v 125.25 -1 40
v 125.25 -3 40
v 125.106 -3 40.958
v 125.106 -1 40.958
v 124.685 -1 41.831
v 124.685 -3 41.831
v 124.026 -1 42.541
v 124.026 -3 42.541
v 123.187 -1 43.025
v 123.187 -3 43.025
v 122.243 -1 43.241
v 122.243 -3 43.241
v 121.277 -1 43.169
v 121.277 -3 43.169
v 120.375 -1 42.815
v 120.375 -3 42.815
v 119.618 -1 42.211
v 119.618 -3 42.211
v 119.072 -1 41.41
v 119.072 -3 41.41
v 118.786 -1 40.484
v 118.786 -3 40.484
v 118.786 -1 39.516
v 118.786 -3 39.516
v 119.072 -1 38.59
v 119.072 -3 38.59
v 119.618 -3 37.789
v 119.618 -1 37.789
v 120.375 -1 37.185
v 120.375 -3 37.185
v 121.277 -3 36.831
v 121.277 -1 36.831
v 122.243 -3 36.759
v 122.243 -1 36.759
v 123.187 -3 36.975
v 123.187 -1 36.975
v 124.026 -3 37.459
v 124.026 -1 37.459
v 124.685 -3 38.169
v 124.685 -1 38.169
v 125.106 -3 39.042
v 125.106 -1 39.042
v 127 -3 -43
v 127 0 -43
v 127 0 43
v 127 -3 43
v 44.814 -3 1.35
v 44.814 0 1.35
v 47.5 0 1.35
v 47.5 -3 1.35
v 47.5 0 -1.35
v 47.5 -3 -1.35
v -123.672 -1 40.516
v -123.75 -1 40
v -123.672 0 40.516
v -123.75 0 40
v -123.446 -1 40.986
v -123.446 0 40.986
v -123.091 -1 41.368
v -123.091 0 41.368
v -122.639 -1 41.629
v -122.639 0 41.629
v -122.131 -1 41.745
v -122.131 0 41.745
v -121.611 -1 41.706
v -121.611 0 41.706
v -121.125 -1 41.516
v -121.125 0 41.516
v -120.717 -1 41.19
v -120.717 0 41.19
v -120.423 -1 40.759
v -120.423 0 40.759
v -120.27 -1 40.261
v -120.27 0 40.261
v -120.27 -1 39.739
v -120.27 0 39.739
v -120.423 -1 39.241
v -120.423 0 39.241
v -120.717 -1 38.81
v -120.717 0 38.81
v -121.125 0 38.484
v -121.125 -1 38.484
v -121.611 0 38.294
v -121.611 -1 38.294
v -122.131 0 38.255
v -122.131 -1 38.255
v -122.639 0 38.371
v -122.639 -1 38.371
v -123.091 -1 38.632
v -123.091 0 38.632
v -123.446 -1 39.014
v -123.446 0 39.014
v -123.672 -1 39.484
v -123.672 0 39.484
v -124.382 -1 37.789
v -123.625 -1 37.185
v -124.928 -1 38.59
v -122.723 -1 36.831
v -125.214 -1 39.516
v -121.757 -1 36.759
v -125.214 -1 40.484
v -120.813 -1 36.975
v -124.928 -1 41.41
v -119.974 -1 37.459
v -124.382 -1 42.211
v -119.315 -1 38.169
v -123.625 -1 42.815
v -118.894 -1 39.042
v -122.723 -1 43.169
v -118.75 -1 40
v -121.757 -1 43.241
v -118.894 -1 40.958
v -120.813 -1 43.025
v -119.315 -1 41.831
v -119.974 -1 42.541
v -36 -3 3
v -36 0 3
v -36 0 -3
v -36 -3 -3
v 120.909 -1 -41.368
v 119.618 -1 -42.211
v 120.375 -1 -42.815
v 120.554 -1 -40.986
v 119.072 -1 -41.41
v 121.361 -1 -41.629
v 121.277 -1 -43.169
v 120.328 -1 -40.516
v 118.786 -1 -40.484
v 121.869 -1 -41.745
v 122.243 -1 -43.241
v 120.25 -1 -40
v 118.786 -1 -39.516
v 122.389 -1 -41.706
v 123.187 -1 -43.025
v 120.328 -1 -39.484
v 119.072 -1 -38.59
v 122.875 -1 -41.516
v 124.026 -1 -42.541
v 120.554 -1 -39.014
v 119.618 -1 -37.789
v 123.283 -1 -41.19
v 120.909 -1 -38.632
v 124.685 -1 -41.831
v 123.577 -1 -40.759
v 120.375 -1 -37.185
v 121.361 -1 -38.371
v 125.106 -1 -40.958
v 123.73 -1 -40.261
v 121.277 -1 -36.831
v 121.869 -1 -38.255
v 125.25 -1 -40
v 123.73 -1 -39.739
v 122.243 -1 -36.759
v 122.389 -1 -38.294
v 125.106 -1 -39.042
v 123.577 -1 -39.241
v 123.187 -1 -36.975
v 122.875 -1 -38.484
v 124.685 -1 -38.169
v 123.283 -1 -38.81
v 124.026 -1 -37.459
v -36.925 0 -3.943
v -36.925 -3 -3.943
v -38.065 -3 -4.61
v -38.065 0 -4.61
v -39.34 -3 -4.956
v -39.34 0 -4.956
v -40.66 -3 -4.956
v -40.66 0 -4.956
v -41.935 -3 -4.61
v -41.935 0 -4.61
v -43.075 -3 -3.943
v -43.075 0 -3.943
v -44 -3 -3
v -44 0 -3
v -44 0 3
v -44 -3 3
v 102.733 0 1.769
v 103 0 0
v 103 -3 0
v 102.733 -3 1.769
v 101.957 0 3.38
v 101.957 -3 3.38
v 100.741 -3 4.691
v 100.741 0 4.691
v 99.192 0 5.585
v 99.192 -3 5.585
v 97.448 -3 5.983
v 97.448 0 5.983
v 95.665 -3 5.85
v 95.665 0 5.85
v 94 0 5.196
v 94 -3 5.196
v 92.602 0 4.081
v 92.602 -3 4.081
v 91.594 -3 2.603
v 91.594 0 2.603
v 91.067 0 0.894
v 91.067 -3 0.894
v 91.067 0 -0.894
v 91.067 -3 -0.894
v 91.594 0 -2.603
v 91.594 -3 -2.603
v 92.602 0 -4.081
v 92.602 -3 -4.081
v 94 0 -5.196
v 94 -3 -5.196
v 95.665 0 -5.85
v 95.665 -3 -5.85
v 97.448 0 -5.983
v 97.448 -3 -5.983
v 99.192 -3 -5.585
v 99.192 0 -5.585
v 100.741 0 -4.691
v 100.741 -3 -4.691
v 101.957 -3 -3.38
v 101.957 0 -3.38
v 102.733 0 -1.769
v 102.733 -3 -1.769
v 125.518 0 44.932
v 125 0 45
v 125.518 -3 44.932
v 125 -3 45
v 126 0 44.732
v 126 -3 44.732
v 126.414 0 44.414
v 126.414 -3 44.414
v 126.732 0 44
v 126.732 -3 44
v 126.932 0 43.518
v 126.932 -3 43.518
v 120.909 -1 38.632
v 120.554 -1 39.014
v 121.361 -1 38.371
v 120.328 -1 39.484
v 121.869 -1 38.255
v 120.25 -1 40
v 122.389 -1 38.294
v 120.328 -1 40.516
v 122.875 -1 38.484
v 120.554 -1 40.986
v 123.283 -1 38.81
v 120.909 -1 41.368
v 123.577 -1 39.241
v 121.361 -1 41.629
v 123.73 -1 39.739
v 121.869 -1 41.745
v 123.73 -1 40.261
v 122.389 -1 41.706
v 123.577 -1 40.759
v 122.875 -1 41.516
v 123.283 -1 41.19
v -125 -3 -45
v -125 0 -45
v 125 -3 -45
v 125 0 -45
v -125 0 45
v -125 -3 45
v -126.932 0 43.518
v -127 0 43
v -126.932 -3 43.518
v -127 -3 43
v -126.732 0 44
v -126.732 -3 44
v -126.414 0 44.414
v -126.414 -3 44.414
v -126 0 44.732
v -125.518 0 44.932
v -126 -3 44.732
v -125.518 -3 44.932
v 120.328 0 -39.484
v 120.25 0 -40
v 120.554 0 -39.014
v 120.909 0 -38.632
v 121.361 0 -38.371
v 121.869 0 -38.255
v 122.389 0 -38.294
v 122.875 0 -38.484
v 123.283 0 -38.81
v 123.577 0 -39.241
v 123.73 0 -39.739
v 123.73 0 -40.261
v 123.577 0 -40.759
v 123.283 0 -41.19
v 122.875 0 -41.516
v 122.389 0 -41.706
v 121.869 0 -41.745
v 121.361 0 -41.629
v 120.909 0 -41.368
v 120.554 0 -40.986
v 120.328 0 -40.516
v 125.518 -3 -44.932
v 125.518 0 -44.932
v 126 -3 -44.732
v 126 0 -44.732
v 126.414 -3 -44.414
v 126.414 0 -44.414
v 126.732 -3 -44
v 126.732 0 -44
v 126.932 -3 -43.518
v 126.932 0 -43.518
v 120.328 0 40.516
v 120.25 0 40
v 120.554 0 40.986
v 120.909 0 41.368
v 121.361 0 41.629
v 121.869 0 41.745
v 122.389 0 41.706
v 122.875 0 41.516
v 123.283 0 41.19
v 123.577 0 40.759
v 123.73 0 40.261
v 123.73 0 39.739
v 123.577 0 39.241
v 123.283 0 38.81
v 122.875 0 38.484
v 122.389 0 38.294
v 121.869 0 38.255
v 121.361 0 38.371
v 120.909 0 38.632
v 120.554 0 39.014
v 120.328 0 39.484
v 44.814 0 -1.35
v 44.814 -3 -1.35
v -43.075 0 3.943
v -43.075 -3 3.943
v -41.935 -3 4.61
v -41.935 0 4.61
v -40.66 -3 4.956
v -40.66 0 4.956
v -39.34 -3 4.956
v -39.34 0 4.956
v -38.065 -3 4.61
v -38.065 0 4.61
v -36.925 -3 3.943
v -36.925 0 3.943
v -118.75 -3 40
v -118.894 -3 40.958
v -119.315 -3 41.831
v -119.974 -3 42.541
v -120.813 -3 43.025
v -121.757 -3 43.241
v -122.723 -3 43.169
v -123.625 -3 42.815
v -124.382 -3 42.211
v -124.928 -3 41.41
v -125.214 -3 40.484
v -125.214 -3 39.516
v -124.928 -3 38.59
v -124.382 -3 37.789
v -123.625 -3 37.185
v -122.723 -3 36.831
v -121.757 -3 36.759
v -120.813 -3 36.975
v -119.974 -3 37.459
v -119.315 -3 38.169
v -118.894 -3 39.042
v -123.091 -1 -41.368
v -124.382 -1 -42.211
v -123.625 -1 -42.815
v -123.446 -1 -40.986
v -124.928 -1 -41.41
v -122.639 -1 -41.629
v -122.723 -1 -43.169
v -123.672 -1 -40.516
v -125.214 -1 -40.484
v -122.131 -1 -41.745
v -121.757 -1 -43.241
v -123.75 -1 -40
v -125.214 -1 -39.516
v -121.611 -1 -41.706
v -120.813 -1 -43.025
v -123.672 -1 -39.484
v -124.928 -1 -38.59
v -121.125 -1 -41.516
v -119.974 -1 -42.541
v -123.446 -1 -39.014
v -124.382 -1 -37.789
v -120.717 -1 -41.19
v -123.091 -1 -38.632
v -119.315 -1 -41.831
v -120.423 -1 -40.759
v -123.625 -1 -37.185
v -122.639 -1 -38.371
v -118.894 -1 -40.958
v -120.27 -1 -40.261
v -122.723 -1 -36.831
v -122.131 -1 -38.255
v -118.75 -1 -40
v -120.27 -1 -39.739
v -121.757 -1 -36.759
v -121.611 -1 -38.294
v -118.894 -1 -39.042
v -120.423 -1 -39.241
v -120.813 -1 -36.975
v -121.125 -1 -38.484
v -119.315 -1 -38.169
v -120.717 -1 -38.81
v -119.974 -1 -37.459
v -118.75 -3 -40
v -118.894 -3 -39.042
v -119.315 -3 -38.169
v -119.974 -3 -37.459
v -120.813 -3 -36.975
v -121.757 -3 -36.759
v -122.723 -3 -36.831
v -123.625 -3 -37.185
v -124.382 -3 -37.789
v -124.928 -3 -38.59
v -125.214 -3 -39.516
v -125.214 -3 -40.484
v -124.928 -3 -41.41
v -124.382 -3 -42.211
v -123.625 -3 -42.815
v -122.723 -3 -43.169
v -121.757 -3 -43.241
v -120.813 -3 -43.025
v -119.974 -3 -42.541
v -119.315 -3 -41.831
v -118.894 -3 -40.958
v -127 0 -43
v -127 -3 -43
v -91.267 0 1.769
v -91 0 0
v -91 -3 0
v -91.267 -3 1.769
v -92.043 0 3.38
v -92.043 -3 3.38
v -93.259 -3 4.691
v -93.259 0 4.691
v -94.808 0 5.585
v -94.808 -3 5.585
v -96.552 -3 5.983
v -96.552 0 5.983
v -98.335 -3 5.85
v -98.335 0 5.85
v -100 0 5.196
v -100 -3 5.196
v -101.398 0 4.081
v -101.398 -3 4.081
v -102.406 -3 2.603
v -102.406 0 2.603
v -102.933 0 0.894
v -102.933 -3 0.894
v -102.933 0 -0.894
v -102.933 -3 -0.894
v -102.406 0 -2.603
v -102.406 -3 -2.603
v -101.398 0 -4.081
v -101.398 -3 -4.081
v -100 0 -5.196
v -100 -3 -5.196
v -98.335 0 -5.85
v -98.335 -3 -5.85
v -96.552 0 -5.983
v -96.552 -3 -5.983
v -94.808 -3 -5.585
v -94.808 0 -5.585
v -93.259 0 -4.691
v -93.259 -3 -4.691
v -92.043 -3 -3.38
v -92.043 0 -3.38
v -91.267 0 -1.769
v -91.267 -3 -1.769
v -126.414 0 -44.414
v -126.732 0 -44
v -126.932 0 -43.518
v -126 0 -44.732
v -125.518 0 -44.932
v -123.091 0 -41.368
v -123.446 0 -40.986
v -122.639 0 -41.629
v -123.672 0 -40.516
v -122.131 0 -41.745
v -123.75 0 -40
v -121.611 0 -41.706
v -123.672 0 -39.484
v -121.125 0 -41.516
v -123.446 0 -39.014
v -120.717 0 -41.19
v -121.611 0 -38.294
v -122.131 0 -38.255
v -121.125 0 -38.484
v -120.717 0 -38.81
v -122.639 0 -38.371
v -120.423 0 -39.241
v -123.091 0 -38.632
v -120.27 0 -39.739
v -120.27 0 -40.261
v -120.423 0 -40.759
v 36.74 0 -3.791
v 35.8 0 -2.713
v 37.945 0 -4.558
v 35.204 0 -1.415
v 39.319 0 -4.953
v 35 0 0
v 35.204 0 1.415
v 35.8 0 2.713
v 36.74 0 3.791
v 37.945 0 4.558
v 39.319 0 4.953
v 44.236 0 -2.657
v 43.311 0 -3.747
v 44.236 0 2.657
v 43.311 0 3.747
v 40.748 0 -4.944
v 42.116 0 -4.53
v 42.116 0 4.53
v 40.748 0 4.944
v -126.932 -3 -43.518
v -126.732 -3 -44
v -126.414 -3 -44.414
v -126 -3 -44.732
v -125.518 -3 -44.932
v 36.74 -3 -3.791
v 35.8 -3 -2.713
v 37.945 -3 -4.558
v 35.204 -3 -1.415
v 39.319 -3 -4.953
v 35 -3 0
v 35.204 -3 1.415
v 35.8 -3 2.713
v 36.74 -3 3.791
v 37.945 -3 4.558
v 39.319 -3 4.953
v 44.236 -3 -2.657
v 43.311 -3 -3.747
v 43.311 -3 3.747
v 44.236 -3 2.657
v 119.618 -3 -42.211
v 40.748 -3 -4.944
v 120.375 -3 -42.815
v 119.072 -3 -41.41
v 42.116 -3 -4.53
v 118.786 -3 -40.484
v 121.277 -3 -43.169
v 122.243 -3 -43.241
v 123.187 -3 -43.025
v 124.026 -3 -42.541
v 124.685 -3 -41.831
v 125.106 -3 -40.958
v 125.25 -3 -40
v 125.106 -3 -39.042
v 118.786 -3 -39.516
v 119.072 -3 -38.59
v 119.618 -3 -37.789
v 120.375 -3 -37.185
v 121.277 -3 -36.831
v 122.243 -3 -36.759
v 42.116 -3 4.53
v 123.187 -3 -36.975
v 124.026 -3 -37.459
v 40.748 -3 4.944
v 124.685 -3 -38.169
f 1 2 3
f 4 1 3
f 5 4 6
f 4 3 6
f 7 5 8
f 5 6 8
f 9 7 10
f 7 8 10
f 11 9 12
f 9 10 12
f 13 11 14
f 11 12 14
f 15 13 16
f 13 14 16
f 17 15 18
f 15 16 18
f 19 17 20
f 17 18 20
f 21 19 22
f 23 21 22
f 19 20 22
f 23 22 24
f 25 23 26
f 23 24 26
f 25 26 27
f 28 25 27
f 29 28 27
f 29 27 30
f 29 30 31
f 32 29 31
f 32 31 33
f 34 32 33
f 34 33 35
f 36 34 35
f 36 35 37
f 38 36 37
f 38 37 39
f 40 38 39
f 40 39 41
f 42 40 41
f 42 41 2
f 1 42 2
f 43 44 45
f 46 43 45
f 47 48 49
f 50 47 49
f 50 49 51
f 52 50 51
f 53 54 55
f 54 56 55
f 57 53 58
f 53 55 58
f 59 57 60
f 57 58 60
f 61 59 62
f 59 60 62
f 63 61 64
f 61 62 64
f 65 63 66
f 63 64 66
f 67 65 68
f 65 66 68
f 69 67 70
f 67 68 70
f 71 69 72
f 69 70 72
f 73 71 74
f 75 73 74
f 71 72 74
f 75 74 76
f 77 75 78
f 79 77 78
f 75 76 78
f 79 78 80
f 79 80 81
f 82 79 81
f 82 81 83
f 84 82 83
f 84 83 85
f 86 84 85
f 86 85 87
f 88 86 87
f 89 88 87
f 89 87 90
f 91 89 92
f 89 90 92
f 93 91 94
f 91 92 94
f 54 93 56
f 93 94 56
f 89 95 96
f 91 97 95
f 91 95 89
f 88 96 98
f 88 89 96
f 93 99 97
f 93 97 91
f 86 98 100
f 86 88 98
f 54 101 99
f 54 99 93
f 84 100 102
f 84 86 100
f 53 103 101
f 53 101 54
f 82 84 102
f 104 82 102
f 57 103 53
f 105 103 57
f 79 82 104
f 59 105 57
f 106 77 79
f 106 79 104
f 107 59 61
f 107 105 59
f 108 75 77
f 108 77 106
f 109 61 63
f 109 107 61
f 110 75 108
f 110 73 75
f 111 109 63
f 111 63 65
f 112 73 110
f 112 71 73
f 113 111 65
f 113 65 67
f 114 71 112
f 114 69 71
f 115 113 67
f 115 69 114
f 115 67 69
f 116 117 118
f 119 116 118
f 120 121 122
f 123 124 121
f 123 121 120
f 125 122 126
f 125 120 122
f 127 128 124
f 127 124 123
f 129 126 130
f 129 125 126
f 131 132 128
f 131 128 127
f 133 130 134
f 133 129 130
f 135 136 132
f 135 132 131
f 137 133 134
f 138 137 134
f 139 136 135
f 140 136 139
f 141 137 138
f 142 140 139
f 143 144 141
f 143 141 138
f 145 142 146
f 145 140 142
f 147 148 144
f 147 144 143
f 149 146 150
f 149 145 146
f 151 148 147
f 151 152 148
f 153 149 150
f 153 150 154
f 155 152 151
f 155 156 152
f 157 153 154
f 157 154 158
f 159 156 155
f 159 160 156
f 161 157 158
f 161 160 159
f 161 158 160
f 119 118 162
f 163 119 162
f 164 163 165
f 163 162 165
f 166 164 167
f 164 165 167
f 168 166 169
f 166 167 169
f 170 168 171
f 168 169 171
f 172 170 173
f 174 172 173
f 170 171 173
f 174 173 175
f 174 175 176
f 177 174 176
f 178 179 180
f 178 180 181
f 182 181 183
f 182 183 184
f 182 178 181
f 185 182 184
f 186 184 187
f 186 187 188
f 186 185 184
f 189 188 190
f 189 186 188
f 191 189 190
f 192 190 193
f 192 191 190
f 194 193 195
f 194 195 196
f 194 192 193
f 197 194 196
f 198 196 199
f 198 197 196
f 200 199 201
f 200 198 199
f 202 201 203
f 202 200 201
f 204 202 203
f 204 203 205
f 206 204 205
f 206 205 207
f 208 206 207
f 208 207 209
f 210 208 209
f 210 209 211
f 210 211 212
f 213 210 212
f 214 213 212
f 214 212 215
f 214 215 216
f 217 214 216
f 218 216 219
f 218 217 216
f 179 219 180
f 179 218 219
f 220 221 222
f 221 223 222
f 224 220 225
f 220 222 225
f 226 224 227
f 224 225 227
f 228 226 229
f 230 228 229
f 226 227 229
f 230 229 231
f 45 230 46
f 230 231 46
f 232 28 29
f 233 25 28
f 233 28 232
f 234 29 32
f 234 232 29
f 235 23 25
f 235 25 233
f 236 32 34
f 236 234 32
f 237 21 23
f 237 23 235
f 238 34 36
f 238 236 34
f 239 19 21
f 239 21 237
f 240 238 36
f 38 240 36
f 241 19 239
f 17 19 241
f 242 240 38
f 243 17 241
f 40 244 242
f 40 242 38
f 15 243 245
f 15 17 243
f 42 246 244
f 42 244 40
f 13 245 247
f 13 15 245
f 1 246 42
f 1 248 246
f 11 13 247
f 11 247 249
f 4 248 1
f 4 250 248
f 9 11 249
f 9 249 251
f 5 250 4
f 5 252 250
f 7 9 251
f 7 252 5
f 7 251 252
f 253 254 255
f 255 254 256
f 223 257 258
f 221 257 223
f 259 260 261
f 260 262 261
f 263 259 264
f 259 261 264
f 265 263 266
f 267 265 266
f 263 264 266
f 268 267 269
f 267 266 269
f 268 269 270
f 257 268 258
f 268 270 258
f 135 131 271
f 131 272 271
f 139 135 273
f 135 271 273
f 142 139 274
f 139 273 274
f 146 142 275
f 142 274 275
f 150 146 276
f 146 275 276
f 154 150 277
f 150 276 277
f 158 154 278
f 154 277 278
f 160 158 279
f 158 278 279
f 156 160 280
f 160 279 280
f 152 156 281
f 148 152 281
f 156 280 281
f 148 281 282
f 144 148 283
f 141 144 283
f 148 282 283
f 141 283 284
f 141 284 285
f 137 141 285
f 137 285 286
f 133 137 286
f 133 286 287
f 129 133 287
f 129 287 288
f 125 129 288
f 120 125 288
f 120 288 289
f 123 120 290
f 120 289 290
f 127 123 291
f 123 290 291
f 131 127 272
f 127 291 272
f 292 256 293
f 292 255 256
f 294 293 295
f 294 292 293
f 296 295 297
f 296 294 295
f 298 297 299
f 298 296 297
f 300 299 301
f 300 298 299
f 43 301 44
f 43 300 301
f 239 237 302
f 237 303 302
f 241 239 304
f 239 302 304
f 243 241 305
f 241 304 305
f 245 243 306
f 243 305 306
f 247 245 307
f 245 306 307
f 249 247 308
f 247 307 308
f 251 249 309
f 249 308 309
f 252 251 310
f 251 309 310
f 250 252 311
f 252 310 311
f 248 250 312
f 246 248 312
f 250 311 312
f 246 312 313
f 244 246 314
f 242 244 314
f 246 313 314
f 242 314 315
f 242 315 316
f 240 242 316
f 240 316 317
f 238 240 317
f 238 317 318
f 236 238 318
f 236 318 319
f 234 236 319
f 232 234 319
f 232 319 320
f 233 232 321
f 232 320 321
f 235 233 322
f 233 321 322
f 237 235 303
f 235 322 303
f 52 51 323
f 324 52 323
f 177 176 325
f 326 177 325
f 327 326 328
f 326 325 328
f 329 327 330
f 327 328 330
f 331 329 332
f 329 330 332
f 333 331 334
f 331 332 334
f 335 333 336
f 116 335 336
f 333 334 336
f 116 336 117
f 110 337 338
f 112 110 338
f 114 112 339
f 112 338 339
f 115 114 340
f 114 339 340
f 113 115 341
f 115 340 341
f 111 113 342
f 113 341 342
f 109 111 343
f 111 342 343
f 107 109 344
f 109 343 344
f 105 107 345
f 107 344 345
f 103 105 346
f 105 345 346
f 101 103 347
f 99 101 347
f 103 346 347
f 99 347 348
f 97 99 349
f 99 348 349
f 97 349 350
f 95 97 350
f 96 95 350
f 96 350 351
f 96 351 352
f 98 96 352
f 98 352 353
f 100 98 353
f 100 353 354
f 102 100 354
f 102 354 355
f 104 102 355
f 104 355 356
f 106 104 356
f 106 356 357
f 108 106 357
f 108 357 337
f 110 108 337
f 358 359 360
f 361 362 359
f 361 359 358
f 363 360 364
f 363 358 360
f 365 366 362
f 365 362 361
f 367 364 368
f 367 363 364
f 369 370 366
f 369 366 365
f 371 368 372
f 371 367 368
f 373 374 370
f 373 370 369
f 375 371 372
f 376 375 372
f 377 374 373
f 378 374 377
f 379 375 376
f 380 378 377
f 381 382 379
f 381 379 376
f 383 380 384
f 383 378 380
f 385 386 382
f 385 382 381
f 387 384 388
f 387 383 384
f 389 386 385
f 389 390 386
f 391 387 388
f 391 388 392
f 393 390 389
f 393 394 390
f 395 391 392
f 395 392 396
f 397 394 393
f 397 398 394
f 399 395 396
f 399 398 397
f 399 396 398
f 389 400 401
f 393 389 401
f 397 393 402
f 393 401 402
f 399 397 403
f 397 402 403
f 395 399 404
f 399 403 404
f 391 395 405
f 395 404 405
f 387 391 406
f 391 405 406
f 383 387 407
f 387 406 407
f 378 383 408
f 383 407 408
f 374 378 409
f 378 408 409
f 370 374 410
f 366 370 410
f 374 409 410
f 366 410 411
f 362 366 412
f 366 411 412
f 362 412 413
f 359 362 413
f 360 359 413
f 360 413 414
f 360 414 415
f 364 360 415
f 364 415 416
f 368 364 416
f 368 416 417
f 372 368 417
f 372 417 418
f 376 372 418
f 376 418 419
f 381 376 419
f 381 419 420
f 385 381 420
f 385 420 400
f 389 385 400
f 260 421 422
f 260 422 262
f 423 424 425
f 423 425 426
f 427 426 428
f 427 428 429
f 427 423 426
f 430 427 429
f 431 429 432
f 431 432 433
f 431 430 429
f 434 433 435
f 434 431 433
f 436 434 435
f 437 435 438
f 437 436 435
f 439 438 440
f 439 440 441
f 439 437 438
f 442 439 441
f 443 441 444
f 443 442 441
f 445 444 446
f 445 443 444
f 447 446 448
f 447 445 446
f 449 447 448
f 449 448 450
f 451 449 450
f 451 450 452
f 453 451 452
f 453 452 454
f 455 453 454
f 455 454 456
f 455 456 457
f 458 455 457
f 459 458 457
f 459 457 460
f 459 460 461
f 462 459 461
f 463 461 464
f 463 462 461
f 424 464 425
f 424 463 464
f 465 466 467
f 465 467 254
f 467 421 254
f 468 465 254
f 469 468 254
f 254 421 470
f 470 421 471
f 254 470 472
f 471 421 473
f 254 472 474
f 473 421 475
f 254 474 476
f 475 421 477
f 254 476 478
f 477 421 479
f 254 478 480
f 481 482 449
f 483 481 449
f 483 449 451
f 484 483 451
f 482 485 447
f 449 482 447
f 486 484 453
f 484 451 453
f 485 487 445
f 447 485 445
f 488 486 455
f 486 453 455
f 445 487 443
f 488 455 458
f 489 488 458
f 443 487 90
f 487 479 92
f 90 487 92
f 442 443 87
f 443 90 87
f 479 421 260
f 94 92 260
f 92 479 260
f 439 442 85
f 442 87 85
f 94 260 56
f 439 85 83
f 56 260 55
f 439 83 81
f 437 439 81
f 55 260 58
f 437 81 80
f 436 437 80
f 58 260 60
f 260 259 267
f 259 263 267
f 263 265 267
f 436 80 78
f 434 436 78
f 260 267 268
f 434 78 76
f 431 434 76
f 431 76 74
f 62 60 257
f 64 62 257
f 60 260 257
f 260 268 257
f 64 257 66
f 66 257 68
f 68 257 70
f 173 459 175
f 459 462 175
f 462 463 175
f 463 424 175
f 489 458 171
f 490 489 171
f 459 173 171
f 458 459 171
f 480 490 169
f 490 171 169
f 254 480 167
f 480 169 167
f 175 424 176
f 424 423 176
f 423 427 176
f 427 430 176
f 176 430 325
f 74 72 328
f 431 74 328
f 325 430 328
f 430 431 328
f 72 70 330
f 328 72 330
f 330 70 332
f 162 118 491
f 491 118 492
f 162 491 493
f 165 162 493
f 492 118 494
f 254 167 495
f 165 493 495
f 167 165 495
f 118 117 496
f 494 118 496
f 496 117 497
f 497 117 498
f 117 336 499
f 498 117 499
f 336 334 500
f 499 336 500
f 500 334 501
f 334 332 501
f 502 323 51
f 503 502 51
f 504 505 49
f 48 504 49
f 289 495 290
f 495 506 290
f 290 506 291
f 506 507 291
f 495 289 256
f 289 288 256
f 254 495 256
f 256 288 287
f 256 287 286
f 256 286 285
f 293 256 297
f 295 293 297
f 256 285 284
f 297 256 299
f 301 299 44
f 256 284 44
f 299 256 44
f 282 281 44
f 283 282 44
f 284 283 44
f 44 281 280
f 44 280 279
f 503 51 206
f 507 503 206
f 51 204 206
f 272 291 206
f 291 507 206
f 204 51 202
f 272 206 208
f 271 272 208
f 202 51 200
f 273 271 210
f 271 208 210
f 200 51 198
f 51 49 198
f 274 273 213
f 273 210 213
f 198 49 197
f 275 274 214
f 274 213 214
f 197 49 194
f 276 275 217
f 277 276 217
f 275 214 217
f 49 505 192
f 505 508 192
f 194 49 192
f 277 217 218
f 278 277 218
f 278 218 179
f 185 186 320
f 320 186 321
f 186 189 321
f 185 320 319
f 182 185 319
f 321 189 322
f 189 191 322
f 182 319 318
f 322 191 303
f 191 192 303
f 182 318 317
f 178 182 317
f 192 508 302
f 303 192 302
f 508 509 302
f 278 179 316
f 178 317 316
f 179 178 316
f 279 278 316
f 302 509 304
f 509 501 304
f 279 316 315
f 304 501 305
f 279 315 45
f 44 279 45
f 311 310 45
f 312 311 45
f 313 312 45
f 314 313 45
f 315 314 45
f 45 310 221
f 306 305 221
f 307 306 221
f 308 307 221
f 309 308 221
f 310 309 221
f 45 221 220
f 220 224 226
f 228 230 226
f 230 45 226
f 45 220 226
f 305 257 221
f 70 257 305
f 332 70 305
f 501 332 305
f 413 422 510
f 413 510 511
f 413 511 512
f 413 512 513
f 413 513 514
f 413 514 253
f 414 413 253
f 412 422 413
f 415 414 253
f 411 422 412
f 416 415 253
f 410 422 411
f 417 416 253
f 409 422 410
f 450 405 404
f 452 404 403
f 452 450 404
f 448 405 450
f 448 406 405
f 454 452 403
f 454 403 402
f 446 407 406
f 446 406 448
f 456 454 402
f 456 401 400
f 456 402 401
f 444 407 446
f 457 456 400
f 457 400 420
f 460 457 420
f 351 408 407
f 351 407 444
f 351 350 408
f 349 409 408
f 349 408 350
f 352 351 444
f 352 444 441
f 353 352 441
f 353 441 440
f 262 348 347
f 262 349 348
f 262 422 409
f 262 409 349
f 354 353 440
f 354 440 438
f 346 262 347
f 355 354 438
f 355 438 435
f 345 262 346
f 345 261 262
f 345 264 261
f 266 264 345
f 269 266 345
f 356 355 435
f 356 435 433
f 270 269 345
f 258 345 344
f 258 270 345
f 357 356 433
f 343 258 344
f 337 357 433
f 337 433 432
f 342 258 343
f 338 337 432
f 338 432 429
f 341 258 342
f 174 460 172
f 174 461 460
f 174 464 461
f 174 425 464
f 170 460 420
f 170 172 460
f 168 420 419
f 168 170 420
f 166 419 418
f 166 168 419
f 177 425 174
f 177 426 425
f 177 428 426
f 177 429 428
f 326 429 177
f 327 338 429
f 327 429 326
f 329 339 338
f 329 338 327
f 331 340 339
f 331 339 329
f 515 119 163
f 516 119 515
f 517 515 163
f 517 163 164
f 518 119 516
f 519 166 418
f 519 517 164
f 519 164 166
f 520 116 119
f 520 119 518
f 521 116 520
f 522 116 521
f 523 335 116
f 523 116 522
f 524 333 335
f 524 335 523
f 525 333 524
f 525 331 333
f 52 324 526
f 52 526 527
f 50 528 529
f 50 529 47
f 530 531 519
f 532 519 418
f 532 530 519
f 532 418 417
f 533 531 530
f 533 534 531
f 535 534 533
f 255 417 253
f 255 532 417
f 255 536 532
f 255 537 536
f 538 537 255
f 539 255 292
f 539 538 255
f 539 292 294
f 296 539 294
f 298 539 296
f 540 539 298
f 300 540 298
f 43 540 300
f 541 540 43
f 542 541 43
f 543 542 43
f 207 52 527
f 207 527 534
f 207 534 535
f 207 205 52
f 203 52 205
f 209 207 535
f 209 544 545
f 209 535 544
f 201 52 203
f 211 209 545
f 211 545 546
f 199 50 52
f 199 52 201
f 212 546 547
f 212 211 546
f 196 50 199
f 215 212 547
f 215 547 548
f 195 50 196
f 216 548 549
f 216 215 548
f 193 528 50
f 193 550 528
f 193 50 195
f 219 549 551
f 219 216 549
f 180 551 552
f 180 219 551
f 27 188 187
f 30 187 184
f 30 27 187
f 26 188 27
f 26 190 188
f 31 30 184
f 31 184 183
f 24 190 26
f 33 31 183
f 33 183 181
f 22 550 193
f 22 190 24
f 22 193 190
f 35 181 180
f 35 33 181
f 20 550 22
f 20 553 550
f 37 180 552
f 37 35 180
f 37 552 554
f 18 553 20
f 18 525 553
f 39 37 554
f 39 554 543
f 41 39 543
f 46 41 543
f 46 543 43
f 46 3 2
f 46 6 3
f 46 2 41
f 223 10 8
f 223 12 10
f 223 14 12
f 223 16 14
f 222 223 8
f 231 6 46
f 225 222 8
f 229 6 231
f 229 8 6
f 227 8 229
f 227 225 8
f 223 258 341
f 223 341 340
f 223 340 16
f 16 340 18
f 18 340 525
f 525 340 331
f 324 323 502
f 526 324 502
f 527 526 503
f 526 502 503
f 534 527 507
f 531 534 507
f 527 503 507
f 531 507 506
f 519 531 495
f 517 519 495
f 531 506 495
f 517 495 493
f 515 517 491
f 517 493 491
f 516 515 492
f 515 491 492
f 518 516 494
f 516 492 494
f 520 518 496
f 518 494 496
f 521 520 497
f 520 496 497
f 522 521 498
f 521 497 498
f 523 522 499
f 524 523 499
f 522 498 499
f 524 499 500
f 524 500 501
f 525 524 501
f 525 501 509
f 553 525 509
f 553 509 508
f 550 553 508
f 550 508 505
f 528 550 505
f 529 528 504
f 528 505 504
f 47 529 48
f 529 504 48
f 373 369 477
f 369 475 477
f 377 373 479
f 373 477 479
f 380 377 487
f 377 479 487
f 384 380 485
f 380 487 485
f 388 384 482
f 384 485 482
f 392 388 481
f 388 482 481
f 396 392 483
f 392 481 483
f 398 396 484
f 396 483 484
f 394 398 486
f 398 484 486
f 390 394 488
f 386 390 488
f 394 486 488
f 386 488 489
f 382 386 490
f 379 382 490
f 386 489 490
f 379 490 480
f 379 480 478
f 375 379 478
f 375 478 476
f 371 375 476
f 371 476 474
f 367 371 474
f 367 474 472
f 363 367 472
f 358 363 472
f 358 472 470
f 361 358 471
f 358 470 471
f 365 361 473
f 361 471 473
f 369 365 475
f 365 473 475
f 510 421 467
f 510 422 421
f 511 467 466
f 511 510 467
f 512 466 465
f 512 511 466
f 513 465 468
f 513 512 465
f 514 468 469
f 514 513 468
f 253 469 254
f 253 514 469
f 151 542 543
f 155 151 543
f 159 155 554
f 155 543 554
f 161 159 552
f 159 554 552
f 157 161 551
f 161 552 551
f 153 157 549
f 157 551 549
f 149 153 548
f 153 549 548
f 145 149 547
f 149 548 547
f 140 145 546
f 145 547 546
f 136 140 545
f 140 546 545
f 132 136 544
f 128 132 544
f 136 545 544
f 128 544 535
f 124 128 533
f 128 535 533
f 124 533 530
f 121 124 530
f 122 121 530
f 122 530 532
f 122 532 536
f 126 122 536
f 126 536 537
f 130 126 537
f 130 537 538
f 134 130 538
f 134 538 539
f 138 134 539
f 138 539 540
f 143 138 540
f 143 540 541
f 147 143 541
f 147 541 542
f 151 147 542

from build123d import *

# Parameters (mm, degrees)
F0_W           = 254
F0_H           = 90
F0_R           = 6
F1_DEPTH       = 3
F3_D           = 3.5
F3_CBORE_D     = 6.5
F3_CBORE_DEPTH = 2
F4_R           = 2


with BuildPart() as f1:
    # F0 (on Front) → F1 (new body)
    with BuildSketch(Plane.XZ):
        Rectangle(F0_W, F0_H)
        with Locations((-97, 0)):
            Circle(F0_R, mode=Mode.SUBTRACT)
        with BuildLine():
            Line((-44, -3), (-44, 3))
            ThreePointArc((-44, 3), (-40, 5), (-36, 3))
            Line((-36, 3), (-36, -3))
            ThreePointArc((-36, -3), (-40, -5), (-44, -3))
        make_face(mode=Mode.SUBTRACT)
        with BuildLine():
            ThreePointArc((44.814302, -1.35), (35, 0), (44.814302, 1.35))
            Line((44.814302, 1.35), (47.5, 1.35))
            Line((47.5, 1.35), (47.5, -1.35))
            Line((47.5, -1.35), (44.814302, -1.35))
        make_face(mode=Mode.SUBTRACT)
        with Locations((97, 0)):
            Circle(F0_R, mode=Mode.SUBTRACT)
    extrude(amount=F1_DEPTH)

    # F3 (through all)
    with Locations(Plane.XZ.offset(3)):
        with Locations((-122, 40), (-122, -40), (122, 40), (122, -40)):
            CounterBoreHole(F3_D / 2, F3_CBORE_D / 2, F3_CBORE_DEPTH)

    # F4
    f4_edges = [f1.edges().sort_by_distance(p)[0] for p in [
        (-127, -1.5, 45),
        (-127, -1.5, -45),
        (127, -1.5, -45),
        (127, -1.5, 45),
    ]]
    fillet(f4_edges, radius=F4_R)


solid = f1.part
